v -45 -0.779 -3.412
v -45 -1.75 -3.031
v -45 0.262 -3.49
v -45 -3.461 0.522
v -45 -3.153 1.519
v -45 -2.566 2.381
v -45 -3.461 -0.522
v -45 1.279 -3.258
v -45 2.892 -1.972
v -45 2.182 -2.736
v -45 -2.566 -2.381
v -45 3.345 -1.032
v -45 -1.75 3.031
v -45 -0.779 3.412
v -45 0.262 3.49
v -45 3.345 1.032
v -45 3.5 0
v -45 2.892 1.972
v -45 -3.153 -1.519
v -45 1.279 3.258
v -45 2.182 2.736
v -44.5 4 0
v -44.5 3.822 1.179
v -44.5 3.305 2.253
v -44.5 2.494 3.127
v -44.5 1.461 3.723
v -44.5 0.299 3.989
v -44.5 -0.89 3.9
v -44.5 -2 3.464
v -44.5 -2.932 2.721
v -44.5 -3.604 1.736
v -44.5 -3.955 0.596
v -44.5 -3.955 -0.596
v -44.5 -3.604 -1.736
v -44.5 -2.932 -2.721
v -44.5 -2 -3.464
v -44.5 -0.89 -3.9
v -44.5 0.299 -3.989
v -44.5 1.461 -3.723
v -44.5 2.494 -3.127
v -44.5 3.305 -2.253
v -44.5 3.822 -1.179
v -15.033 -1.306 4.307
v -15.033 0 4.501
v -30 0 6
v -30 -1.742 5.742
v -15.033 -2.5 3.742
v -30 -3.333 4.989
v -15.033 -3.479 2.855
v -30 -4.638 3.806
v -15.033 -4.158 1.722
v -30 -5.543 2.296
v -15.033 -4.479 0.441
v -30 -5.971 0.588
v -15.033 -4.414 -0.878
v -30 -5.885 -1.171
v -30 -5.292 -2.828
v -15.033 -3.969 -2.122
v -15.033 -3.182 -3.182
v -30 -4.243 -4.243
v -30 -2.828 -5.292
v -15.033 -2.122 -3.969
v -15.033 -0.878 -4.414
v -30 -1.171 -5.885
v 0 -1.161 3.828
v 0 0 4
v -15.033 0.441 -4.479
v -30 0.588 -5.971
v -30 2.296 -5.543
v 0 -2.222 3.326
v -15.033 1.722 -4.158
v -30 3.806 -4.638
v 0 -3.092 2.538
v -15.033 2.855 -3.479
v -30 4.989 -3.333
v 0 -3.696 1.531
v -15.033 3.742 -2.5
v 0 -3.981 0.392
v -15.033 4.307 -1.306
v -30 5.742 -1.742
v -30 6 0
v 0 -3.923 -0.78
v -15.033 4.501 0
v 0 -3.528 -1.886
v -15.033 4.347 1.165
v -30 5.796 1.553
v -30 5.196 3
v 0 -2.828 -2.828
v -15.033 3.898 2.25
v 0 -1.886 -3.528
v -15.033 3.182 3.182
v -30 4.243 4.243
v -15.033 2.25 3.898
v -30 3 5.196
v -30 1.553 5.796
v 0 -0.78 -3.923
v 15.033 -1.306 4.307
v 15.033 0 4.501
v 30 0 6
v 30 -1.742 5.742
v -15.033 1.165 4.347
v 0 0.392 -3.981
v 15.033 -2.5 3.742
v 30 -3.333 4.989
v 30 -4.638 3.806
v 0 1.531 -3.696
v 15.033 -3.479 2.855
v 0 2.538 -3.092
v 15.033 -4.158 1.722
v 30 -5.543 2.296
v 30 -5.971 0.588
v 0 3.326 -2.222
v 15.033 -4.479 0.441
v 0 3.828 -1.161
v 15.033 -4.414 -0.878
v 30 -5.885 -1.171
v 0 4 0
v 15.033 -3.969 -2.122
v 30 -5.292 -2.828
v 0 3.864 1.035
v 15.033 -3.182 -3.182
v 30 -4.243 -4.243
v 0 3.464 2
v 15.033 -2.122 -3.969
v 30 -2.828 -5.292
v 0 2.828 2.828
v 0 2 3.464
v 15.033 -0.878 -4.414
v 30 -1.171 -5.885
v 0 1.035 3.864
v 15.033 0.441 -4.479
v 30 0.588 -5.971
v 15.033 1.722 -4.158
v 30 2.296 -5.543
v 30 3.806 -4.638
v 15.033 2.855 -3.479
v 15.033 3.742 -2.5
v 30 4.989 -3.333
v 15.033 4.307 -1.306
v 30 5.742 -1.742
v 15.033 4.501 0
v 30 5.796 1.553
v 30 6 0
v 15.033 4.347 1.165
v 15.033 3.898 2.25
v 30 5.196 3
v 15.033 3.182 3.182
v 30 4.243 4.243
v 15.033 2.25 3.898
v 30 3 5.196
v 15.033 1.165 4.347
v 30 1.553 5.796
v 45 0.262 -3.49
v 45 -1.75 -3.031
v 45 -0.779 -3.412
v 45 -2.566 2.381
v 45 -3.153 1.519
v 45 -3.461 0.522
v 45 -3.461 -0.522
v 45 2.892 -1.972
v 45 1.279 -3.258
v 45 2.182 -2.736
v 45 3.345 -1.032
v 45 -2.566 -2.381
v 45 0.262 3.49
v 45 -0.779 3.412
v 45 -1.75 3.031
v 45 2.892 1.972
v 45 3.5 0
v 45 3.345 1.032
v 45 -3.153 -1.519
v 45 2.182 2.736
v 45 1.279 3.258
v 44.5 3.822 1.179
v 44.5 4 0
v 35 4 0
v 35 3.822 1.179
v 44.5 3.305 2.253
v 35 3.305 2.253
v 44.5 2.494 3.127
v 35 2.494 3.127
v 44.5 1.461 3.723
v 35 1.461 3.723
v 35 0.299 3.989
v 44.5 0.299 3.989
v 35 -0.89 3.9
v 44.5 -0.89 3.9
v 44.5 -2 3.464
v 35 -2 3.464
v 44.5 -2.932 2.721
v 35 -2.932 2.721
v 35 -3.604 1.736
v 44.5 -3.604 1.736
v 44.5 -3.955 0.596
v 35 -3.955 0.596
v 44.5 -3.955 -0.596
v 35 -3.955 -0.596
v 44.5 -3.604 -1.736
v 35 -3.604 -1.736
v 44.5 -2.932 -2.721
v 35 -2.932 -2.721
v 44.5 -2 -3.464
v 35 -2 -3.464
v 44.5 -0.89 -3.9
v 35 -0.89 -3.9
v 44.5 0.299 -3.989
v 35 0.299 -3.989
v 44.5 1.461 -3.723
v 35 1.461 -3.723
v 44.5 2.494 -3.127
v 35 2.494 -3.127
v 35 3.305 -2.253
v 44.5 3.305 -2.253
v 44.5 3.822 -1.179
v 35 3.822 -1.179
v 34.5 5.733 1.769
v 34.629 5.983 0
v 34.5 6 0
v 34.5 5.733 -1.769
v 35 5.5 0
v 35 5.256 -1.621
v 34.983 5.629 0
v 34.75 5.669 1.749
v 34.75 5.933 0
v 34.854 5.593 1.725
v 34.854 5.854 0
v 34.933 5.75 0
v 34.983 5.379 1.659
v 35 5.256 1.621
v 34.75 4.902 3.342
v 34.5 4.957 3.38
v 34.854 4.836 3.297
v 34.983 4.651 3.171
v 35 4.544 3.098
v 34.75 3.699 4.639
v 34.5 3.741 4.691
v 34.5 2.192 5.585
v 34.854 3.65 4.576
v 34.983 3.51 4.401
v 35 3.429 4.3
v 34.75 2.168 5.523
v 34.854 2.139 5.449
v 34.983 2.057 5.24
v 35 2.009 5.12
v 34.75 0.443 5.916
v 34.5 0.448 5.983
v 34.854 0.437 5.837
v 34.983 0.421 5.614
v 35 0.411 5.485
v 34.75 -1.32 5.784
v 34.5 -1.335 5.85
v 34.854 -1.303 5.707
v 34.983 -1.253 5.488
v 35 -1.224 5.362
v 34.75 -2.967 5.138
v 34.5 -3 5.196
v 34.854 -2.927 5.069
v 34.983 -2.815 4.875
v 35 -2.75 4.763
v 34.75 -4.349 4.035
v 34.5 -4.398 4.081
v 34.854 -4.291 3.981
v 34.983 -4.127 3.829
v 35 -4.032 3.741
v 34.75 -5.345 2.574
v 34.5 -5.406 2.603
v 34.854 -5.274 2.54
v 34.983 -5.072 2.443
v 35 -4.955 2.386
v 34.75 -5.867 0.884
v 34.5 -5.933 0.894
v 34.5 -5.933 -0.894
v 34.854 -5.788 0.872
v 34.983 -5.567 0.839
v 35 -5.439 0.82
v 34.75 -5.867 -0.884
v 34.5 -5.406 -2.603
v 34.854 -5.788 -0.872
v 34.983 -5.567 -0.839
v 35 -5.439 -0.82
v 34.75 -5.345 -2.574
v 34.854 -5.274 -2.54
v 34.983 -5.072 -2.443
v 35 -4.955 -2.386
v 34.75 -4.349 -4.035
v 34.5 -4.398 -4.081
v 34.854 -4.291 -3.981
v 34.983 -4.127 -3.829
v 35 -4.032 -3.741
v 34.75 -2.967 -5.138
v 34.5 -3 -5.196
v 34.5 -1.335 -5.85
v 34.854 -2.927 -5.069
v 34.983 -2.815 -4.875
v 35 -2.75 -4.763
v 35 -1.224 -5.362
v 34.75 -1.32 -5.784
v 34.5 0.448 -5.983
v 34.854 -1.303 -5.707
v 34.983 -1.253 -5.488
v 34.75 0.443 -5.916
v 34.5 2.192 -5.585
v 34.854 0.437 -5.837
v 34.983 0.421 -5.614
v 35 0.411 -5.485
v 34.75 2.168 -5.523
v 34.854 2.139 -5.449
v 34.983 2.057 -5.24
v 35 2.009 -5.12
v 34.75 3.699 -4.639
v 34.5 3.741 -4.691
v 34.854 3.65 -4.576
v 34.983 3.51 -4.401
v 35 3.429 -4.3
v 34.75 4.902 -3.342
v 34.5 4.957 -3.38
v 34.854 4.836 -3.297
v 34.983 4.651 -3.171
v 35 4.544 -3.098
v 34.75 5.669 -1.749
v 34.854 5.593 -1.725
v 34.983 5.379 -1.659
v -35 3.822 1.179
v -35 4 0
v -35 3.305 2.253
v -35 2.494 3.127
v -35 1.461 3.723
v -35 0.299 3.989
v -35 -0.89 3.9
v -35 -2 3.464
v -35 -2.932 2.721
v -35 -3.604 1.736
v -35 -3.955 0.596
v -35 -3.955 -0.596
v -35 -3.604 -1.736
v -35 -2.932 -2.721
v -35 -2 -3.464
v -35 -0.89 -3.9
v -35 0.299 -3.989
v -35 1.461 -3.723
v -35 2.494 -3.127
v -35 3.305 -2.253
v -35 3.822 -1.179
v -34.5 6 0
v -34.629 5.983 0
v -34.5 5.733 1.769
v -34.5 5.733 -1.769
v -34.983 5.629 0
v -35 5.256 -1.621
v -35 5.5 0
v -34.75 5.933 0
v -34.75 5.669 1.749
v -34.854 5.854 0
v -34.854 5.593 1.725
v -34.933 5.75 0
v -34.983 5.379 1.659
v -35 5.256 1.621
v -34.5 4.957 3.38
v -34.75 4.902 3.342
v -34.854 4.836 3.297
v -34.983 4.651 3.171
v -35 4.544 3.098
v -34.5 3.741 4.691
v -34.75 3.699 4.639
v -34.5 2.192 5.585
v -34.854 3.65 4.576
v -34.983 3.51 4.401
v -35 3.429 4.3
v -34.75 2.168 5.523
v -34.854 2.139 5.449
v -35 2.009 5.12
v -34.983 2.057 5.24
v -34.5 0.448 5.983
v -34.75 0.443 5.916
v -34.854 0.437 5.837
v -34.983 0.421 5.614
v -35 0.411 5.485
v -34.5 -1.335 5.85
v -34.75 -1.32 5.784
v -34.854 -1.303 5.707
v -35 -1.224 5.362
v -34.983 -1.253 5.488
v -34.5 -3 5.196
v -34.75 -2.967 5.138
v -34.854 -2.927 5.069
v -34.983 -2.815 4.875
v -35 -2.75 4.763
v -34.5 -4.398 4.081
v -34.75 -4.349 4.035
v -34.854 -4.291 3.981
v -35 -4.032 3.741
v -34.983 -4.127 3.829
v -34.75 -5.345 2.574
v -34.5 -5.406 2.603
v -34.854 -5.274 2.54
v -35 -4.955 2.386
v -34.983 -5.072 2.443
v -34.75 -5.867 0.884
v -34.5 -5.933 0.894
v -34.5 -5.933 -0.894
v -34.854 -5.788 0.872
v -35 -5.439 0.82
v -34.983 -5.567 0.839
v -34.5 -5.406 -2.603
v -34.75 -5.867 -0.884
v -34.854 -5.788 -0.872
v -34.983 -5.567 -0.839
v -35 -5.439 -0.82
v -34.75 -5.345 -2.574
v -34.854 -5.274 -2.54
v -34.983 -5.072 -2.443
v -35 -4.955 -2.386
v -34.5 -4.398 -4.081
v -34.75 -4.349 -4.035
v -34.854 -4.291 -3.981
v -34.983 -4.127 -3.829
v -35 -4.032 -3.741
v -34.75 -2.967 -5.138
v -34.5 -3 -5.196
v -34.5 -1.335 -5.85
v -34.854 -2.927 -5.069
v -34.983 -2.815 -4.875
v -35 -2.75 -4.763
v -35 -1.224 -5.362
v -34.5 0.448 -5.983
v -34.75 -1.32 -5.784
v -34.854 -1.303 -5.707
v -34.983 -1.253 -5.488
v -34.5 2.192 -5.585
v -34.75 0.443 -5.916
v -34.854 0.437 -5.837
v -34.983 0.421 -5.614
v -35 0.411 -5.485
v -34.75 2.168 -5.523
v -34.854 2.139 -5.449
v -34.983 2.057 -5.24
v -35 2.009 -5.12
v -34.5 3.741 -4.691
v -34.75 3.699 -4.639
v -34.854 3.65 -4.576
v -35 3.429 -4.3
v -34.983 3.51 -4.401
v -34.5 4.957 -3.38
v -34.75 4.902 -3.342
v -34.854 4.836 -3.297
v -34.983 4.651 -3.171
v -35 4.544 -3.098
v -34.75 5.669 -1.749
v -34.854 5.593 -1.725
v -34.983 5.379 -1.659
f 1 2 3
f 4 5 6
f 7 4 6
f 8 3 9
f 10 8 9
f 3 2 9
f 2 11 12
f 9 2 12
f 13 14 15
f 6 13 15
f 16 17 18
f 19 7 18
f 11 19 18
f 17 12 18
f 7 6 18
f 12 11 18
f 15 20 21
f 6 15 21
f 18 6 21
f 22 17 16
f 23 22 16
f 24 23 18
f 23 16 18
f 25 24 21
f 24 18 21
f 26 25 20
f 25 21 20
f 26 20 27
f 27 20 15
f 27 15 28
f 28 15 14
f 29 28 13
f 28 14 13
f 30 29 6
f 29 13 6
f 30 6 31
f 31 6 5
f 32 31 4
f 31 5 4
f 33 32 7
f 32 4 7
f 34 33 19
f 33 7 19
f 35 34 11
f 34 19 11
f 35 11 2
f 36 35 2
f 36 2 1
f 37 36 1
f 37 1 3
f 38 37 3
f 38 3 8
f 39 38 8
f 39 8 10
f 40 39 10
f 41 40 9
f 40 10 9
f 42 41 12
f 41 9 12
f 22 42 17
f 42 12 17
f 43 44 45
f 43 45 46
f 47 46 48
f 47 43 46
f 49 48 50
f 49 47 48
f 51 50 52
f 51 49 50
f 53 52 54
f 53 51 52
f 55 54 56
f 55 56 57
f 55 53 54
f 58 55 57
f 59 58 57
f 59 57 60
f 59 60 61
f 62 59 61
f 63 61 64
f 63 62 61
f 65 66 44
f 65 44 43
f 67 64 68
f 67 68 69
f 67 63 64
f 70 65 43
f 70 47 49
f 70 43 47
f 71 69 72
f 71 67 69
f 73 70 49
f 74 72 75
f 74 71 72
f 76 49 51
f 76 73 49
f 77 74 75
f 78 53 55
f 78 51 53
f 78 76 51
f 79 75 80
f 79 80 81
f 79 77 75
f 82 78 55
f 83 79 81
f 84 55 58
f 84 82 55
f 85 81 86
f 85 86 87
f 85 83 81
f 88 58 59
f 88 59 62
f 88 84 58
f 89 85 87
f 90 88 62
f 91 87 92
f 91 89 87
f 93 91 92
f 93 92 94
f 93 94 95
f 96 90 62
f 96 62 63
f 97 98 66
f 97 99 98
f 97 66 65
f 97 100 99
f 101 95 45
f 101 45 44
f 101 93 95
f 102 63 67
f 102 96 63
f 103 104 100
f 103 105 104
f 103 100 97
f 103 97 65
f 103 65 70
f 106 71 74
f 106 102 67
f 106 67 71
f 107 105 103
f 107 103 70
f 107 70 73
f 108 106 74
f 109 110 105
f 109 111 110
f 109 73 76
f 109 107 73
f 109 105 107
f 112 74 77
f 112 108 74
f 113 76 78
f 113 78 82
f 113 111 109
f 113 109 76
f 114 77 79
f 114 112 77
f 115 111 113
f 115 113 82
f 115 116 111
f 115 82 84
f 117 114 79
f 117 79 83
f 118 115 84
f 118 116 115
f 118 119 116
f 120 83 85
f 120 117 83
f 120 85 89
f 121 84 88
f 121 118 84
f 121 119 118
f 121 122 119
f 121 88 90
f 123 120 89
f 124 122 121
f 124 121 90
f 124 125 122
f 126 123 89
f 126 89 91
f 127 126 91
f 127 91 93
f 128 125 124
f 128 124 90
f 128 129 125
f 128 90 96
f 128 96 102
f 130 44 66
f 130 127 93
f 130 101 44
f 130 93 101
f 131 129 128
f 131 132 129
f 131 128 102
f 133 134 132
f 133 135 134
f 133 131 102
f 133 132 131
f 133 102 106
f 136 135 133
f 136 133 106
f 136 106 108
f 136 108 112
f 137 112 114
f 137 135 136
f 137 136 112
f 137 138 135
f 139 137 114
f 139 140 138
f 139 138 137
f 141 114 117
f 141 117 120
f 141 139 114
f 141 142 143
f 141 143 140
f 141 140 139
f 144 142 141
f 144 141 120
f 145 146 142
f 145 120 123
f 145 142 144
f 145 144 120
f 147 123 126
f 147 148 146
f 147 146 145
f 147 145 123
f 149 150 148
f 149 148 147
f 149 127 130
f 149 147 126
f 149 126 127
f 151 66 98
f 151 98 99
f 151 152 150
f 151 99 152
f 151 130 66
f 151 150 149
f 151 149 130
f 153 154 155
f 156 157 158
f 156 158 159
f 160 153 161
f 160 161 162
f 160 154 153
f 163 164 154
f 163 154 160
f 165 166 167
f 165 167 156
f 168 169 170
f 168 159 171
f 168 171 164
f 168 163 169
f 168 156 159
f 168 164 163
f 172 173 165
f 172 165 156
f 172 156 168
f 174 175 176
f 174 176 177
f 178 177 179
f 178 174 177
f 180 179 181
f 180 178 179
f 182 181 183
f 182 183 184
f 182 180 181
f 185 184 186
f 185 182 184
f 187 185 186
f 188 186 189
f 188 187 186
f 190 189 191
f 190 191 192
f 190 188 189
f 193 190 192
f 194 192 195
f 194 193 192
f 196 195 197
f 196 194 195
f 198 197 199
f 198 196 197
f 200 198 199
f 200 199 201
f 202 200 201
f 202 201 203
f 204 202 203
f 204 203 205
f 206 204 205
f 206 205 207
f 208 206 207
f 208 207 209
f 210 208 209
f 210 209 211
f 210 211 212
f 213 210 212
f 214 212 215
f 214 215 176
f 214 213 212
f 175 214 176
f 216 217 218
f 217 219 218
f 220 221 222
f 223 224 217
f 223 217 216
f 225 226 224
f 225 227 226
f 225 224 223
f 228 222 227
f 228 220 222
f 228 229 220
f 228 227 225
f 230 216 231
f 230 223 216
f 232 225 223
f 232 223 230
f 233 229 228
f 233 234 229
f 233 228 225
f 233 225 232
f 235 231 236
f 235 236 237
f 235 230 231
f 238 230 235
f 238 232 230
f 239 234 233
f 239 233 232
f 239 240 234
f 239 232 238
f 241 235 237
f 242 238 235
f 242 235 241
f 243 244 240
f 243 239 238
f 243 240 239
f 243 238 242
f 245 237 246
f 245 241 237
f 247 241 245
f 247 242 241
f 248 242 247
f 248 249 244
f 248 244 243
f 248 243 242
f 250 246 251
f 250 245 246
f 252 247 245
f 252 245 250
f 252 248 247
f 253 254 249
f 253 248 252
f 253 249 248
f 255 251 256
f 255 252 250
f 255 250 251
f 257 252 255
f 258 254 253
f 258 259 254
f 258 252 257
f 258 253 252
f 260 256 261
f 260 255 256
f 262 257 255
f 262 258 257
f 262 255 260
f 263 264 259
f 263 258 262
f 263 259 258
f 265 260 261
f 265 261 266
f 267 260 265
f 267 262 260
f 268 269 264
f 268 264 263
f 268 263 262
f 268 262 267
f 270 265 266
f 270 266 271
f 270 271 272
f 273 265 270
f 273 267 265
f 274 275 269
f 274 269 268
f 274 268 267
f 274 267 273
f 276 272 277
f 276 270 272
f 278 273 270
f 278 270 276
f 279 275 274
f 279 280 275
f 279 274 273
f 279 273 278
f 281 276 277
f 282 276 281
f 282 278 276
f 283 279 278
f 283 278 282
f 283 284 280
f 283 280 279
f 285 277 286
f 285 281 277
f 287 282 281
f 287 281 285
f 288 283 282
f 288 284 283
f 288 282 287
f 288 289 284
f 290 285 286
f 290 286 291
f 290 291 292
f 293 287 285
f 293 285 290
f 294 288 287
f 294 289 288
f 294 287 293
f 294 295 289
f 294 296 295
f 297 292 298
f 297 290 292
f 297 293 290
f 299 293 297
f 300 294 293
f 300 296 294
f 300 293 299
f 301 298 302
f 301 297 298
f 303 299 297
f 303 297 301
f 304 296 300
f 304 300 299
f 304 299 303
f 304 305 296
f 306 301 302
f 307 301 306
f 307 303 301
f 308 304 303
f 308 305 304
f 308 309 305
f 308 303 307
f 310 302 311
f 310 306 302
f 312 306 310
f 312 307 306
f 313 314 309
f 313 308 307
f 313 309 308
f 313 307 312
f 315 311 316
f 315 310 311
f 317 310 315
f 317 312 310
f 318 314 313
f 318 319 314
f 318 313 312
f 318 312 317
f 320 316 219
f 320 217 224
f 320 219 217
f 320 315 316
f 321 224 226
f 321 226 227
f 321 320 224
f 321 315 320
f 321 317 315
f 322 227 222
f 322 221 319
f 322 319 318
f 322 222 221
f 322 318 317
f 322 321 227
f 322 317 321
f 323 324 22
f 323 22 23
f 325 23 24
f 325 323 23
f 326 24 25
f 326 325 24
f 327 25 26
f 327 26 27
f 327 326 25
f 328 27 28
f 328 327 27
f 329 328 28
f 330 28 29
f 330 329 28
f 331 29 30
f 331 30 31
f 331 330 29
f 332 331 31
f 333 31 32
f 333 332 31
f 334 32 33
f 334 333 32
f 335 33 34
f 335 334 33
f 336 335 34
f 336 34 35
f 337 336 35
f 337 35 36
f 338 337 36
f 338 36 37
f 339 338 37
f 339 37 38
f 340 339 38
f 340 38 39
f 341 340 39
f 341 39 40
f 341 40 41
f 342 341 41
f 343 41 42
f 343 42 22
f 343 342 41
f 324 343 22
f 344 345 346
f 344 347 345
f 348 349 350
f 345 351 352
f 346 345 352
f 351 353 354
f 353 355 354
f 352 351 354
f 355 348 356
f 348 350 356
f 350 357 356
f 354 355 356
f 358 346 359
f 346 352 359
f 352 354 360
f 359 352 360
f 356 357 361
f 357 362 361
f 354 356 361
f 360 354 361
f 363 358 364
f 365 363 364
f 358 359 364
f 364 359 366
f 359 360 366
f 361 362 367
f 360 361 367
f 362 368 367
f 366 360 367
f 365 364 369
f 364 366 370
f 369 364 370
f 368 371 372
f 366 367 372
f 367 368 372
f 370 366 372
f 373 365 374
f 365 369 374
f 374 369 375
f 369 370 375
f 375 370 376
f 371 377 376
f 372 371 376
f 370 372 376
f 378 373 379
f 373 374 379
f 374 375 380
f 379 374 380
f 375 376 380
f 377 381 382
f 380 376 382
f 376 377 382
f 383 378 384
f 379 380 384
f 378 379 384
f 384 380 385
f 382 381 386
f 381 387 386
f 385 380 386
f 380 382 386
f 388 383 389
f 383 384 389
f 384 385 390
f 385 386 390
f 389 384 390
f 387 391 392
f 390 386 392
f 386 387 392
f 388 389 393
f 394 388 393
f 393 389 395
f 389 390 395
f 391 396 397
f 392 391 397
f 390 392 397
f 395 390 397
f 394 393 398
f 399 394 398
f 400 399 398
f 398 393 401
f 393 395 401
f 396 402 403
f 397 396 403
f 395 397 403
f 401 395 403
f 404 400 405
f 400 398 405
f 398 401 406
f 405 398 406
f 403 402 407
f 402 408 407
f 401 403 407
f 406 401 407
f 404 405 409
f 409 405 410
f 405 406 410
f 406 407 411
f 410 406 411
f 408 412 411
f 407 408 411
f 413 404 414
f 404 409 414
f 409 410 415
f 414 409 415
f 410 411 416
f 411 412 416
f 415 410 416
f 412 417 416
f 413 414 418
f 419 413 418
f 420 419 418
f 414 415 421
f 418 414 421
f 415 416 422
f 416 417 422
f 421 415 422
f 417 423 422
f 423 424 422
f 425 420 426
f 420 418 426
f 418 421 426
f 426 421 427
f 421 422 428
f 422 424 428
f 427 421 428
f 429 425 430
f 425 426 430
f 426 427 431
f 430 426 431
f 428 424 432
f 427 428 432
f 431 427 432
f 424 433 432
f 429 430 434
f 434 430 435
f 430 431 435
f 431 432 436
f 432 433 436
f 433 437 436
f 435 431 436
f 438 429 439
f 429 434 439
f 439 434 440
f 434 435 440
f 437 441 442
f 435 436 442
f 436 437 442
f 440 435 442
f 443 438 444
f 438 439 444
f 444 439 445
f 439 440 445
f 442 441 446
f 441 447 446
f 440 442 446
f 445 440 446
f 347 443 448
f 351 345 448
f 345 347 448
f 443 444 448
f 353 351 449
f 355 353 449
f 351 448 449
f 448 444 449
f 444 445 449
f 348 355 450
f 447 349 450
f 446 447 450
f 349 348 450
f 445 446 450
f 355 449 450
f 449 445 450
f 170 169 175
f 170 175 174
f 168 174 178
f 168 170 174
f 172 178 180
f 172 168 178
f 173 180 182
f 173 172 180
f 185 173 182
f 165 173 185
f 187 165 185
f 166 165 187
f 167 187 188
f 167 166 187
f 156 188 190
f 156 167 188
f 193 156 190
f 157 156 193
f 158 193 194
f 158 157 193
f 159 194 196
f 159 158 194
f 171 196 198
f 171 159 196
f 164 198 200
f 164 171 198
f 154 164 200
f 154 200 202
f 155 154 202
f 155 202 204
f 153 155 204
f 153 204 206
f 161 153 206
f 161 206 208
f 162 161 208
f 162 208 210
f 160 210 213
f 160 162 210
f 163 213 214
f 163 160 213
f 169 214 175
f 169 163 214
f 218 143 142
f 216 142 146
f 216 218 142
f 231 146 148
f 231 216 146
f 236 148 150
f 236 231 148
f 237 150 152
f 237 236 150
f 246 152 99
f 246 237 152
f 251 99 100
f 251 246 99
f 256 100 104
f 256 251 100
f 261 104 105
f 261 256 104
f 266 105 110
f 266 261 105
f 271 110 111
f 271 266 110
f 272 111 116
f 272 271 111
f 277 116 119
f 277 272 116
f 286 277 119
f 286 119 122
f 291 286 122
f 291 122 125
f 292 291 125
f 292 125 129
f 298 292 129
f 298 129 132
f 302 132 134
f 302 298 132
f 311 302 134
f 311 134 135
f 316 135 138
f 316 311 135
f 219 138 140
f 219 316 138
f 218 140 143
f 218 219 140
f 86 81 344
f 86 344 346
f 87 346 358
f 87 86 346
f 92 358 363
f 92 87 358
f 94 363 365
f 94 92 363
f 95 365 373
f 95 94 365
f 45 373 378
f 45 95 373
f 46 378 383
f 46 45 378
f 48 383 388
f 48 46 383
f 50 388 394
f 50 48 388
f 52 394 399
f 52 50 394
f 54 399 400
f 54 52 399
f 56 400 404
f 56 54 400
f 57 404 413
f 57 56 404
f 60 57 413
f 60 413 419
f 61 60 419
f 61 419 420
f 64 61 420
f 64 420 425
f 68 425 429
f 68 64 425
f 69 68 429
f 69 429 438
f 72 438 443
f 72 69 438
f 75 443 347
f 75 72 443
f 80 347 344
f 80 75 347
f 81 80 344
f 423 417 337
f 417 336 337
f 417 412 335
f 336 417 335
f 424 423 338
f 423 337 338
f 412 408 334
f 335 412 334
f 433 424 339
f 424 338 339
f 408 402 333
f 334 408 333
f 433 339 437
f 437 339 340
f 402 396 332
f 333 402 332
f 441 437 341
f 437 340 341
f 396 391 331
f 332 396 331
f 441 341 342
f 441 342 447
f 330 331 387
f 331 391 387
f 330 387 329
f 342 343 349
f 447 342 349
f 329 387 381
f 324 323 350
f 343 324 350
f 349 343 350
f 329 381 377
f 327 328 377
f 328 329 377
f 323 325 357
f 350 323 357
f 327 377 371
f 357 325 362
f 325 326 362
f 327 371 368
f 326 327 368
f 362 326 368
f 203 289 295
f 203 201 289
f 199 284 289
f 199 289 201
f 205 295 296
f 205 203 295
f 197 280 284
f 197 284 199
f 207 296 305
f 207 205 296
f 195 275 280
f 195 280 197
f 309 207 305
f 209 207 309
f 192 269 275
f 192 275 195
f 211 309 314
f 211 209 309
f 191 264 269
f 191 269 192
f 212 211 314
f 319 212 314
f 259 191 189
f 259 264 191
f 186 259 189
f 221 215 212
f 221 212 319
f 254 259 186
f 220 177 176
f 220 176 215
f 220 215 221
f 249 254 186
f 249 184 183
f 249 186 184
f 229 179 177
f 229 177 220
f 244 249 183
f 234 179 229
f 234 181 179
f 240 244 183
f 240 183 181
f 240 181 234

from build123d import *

# Parameters (mm, degrees)
F0_R     = 4
F1_DEPTH = 45
F2_R     = 6
F3_DEPTH = 35
F7_R     = 0.5
F8_SIZE  = 0.5


with BuildPart() as f1:
    # F0 (on Right) → F1 (new body, symmetric)
    with BuildSketch(Plane.YZ):
        Circle(F0_R)
    extrude(amount=F1_DEPTH, both=True)

    # F2 (on Right) → F3 (join, symmetric)
    with BuildSketch(Plane.YZ):
        Circle(F2_R)
    extrude(amount=F3_DEPTH, both=True)

    # F4 (on Front) → F6 (revolve, cut)
    with BuildSketch(Plane.XZ):
        with BuildLine():
            Line((30, 6), (-30, 6))
            ThreePointArc((-30, 6), (0, 4), (30, 6))
        make_face()
    revolve(axis=Axis((12.5838983804, 0, 0), (1, 0, 0)), mode=Mode.SUBTRACT)

    # F7
    f7_edges = [f1.edges().sort_by_distance(p)[0] for p in [
        (-35, -6, 0),
        (35, -6, 0),
    ]]
    fillet(f7_edges, radius=F7_R)

    # F8
    f8_edges = [f1.edges().sort_by_distance(p)[0] for p in [
        (-45, -4, 0),
        (45, -4, 0),
    ]]
    chamfer(f8_edges, length=F8_SIZE)


solid = f1.part
